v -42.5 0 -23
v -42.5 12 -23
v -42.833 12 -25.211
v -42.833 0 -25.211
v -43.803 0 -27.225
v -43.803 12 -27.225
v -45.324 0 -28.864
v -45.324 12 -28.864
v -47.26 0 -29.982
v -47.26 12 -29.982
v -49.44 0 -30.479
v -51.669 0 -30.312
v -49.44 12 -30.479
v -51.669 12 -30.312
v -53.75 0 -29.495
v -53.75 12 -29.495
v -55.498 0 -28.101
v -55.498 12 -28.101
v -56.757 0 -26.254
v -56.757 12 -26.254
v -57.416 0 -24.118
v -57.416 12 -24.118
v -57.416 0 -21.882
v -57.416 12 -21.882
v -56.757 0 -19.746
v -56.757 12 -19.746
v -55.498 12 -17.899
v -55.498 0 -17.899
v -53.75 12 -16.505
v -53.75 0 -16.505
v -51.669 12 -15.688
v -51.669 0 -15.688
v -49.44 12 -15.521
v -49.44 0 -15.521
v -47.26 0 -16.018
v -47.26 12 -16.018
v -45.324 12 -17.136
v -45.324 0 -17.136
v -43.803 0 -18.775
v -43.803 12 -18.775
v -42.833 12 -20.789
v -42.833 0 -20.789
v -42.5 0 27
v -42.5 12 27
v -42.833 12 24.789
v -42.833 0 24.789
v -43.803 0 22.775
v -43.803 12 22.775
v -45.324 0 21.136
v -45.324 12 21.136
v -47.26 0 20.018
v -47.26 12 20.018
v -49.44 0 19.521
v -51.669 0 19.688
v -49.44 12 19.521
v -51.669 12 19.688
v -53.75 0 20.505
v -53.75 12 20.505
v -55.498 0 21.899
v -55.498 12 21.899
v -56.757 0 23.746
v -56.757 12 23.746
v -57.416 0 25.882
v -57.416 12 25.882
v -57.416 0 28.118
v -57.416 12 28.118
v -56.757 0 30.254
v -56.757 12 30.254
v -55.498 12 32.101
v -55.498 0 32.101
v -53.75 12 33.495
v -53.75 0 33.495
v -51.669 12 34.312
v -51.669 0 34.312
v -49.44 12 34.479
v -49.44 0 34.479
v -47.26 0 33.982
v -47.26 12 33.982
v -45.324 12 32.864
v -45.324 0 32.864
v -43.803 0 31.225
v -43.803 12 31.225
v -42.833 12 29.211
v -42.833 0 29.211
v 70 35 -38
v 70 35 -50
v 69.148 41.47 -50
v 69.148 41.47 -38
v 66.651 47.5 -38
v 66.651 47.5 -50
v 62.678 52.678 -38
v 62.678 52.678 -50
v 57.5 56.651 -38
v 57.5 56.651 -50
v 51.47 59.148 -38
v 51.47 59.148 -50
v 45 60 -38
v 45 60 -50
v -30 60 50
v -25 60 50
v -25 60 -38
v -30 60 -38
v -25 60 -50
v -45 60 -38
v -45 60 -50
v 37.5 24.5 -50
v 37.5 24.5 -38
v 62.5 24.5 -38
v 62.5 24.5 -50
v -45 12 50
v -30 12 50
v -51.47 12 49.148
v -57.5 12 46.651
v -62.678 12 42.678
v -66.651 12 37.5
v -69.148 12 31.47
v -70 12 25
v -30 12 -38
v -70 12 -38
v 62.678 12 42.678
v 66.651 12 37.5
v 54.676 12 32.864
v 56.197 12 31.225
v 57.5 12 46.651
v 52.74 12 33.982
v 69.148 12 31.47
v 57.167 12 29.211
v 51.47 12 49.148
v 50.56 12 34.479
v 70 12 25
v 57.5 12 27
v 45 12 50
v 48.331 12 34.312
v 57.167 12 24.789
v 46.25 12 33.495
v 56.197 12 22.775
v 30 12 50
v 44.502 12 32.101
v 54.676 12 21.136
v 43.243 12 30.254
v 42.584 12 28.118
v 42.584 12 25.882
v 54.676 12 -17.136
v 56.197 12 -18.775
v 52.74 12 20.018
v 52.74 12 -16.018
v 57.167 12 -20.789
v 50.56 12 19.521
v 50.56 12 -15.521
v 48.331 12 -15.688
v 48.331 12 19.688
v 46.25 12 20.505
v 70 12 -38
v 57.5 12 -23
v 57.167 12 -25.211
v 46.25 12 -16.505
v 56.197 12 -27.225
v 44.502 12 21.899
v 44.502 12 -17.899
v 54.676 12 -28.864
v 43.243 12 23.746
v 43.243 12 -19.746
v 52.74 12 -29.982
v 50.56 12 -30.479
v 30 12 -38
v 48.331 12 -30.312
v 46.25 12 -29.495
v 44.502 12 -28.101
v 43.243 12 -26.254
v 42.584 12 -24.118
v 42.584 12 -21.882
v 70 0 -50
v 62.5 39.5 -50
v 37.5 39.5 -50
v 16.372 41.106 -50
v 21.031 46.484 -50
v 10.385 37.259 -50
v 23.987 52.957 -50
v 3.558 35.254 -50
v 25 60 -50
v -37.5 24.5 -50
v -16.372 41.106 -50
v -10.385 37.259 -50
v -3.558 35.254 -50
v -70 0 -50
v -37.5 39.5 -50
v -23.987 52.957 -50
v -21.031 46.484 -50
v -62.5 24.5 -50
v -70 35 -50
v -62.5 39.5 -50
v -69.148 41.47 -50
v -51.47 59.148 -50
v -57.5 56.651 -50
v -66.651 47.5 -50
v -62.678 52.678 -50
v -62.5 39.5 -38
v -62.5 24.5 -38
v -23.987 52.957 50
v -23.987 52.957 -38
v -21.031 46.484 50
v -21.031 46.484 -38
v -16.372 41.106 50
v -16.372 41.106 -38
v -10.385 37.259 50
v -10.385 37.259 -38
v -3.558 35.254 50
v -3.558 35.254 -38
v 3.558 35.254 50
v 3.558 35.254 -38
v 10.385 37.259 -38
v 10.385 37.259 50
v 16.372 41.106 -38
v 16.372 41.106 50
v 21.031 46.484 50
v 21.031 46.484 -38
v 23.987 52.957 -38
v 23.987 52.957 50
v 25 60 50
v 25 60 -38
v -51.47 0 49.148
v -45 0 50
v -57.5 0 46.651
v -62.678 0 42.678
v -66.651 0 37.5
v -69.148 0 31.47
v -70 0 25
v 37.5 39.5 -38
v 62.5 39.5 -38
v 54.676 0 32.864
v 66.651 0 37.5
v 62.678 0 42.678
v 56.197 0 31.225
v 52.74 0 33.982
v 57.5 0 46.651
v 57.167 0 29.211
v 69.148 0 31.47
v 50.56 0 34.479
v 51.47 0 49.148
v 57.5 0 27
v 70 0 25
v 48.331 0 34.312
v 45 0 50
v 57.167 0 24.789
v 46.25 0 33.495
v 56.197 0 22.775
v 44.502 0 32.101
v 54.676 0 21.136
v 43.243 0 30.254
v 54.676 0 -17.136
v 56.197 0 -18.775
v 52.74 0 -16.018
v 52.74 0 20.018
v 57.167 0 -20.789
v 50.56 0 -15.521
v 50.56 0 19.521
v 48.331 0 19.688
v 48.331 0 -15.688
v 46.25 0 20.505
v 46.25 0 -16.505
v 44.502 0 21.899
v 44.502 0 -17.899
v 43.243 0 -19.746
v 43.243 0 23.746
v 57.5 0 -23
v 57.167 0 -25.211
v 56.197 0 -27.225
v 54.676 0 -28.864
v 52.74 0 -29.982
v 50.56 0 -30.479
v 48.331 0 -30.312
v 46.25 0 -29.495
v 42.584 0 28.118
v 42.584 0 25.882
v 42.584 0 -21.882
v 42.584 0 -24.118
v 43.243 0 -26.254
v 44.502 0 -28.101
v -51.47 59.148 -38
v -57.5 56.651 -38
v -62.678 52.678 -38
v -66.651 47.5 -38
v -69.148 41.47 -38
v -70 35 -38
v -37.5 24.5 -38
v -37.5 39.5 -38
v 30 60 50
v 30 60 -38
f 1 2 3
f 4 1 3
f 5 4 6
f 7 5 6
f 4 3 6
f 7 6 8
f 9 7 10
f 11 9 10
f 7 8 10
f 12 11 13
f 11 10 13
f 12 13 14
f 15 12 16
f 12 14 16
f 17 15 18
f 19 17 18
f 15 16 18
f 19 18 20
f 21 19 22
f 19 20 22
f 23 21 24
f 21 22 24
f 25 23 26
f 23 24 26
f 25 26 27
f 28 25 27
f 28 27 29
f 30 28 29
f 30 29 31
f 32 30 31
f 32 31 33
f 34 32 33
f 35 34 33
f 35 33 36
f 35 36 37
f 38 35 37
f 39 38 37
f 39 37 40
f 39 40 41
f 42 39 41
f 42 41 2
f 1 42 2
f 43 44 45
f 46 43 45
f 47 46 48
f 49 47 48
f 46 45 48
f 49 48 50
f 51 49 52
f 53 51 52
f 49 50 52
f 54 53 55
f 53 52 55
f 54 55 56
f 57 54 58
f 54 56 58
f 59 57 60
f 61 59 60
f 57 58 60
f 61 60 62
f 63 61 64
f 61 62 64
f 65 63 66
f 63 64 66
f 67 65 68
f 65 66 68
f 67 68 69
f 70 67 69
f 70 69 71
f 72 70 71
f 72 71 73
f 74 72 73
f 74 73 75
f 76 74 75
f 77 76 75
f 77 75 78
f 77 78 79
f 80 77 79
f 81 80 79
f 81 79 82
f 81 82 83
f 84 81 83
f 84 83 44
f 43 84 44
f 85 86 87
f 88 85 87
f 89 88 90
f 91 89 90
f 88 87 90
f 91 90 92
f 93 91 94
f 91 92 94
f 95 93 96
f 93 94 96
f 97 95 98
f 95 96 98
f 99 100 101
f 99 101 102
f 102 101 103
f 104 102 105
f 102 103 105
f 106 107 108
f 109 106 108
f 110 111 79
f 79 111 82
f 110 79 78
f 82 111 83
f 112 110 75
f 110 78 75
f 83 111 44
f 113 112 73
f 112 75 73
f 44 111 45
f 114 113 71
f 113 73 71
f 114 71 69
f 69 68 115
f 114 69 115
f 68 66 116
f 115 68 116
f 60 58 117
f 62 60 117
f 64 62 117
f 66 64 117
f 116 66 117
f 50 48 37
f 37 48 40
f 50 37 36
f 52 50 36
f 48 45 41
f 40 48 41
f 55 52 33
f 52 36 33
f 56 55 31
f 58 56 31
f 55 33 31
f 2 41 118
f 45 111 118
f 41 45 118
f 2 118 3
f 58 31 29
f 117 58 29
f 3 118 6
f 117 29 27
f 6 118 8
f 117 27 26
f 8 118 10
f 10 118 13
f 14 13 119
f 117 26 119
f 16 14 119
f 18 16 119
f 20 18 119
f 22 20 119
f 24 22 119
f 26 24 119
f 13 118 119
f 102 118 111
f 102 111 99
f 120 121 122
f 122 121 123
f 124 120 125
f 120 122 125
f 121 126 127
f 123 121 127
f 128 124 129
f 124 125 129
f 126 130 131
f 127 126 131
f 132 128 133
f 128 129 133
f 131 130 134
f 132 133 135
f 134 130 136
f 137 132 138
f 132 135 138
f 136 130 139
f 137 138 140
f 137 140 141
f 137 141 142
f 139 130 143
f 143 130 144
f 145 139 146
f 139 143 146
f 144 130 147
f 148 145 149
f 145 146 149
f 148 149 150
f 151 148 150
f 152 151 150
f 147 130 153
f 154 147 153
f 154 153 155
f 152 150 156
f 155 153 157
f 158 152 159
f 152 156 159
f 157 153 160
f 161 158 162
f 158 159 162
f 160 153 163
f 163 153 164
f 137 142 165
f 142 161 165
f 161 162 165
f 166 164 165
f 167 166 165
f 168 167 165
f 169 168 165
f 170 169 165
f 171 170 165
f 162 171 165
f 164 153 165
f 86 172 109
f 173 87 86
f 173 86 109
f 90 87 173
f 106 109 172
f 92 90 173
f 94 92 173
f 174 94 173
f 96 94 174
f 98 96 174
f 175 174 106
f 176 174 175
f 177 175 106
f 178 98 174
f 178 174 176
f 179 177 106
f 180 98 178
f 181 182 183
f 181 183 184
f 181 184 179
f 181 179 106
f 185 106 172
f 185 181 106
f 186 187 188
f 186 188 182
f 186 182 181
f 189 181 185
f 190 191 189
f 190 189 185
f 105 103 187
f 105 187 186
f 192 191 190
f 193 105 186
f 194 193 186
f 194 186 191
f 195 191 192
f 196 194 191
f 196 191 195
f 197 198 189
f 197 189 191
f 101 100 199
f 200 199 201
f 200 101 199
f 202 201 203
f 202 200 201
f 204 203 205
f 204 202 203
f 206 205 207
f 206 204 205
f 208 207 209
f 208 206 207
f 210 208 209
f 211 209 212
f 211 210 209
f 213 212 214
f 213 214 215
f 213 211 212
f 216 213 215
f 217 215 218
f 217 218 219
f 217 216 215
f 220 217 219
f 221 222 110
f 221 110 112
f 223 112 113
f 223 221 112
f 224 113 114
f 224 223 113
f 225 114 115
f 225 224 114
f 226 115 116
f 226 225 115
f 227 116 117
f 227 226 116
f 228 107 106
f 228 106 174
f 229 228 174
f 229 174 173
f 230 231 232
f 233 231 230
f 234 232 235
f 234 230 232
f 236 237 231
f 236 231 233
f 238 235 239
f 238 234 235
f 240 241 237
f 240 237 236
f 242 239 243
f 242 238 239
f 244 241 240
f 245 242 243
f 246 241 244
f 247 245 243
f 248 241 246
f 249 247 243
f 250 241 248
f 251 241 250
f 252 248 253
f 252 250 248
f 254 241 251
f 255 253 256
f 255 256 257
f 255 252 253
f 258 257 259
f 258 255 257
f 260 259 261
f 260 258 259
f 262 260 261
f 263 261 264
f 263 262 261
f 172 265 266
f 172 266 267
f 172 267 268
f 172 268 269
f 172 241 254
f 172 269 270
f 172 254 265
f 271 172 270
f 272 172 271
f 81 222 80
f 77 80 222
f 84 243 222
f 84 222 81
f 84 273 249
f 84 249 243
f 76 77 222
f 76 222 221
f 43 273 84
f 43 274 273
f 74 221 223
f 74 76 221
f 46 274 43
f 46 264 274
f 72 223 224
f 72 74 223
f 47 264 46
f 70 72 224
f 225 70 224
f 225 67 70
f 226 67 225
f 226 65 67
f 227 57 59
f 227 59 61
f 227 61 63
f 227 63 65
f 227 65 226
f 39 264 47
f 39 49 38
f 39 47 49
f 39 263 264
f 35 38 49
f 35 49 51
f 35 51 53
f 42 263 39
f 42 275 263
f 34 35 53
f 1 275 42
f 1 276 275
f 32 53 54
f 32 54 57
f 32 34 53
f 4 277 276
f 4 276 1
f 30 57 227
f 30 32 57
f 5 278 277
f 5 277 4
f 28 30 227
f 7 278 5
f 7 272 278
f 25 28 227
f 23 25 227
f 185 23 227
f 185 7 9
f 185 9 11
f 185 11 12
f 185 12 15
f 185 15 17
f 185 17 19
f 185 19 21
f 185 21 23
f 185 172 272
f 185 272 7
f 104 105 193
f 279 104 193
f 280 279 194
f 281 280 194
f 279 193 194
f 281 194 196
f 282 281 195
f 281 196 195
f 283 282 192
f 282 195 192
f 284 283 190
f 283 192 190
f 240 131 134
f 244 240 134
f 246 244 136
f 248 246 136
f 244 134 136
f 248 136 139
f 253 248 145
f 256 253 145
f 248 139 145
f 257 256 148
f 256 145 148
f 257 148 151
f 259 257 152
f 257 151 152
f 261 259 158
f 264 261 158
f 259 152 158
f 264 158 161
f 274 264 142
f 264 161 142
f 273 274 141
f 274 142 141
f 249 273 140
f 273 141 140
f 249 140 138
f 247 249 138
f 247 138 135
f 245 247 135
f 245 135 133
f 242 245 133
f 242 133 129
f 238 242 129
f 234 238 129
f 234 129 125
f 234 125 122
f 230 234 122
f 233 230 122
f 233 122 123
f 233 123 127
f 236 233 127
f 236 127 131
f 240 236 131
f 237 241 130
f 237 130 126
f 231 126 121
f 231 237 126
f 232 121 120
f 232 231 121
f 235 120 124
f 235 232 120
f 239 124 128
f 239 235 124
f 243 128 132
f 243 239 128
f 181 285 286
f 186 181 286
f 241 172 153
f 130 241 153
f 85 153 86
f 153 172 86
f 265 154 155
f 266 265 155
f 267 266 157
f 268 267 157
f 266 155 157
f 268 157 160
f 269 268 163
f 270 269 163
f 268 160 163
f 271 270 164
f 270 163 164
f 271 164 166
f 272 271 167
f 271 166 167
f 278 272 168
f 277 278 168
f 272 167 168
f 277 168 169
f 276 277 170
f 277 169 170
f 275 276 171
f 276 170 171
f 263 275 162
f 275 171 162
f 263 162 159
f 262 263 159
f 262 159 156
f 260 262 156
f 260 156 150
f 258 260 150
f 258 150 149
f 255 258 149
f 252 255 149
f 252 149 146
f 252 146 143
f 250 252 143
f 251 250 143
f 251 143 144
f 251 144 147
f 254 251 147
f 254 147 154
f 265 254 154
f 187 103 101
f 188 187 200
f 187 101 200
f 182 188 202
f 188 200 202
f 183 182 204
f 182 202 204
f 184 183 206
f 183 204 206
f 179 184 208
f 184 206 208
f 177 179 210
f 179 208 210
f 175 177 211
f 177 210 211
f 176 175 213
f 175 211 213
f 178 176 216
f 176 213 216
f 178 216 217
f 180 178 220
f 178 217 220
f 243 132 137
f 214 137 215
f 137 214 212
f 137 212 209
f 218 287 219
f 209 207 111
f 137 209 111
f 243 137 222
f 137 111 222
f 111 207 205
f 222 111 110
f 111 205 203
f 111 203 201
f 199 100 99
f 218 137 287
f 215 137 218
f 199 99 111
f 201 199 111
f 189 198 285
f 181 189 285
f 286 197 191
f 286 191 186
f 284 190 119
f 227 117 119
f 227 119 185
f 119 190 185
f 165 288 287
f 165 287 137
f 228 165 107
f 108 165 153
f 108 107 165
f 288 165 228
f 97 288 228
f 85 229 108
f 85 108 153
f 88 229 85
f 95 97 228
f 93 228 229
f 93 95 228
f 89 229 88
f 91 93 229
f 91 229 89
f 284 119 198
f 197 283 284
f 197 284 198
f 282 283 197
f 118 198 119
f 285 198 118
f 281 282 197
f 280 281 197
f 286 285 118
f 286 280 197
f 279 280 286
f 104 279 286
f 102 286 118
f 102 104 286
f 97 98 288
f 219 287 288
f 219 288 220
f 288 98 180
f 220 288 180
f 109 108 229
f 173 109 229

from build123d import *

# Parameters (mm, degrees)
BOSS_EXTRUDE2_DEPTH       = 12
BOSS_EXTRUDE3_DEPTH       = 12
BOSS_EXTRUDE6_DEPTH       = 100
SKETCH5_R                 = 25
CUT_EXTRUDE1_DEPTH        = 100
SKETCH7_R                 = 7.5
CUT_EXTRUDE2_DEPTH        = 100
LPATTERN2_COUNT           = 2
LPATTERN2_PITCH           = 50
LPATTERN5_COUNT           = 2
LPATTERN5_PITCH           = 100
LPATTERN6_COPY_1_SKETCH_R = 7.5
LPATTERN6_COPY_1_DEPTH    = 100
LPATTERN6_COPY_2_SKETCH_R = 7.5
LPATTERN6_COPY_2_DEPTH    = 100
SKETCH8_W                 = 25
SKETCH8_H                 = 15
CUT_EXTRUDE3_DEPTH        = 100


with BuildPart() as part:
    # Sketch1 → Boss-Extrude2 (new body)
    with BuildSketch(Plane(origin=(0, 0, 0), x_dir=(1, 0, 0), z_dir=(0, 1, 0))):
        with BuildLine():
            Line((-70, 50), (70, 50))
            Line((70, 50), (70, -25))
            ThreePointArc((70, -25), (62.67766953, -42.67766953), (45, -50))
            Line((45, -50), (-45, -50))
            ThreePointArc((-45, -50), (-62.67766953, -42.67766953), (-70, -25))
            Line((-70, -25), (-70, 50))
        make_face()
    extrude(amount=BOSS_EXTRUDE2_DEPTH)

    # Sketch2 → Boss-Extrude3 (add)
    with BuildSketch(Plane(origin=(0, 0, -50), x_dir=(-1, 0, 0), z_dir=(0, 0, -1))):
        with BuildLine():
            Line((-70, 12), (-70, 35))
            ThreePointArc((-70, 35), (-62.67766953, 52.67766953), (-45, 60))
            Line((-45, 60), (45, 60))
            ThreePointArc((45, 60), (62.67766953, 52.67766953), (70, 35))
            Line((70, 35), (70, 12))
            Line((70, 12), (-70, 12))
        make_face()
    extrude(amount=-BOSS_EXTRUDE3_DEPTH)

    # Sketch4 → Boss-Extrude6 (add)
    with BuildSketch(Plane(origin=(0, 0, -50), x_dir=(-1, 0, 0), z_dir=(0, 0, -1))):
        with BuildLine():
            Line((-25, 60), (-30, 60))
            Line((-30, 60), (-30, 12))
            Line((-30, 12), (30, 12))
            Line((30, 12), (30, 60))
            Line((30, 60), (25, 60))
            ThreePointArc((25, 60), (0, 35), (-25, 60))
        make_face()
    extrude(amount=-BOSS_EXTRUDE6_DEPTH)

    # Sketch5 → Cut-Extrude1 (cut)
    with BuildSketch(Plane.XY.offset(-38)):
        with Locations((0, 60)):
            Circle(SKETCH5_R)
    extrude(amount=-CUT_EXTRUDE1_DEPTH, mode=Mode.SUBTRACT)

    # Sketch7 → Cut-Extrude2 (cut)
    with BuildSketch(Plane(origin=(0, 12, 0), x_dir=(1, 0, 0), z_dir=(0, 1, 0))):
        with Locations((50, 23)):
            Circle(SKETCH7_R)
    cut_extrude2 = extrude(amount=-CUT_EXTRUDE2_DEPTH, mode=Mode.SUBTRACT)

    # LPattern2: Cut-Extrude2 ×2
    with Locations(*[(0, 0, i * LPATTERN2_PITCH) for i in range(1, LPATTERN2_COUNT)]):
        add(cut_extrude2, mode=Mode.SUBTRACT)

    # LPattern5: Cut-Extrude2 ×2
    with Locations(*[(-i * LPATTERN5_PITCH, 0, 0) for i in range(1, LPATTERN5_COUNT)]):
        add(cut_extrude2, mode=Mode.SUBTRACT)

    # LPattern6 copy 1 sketch → LPattern6 copy 1 (cut)
    with BuildSketch(Plane(origin=(-100, 12, 50), x_dir=(1, 0, 0), z_dir=(0, 1, 0))):
        with Locations((50, 23)):
            Circle(LPATTERN6_COPY_1_SKETCH_R)
    extrude(amount=-LPATTERN6_COPY_1_DEPTH, mode=Mode.SUBTRACT)

    # LPattern6 copy 2 sketch → LPattern6 copy 2 (cut)
    with BuildSketch(Plane(origin=(0, 12, 50), x_dir=(1, 0, 0), z_dir=(0, 1, 0))):
        with Locations((50, 23)):
            Circle(LPATTERN6_COPY_2_SKETCH_R)
    extrude(amount=-LPATTERN6_COPY_2_DEPTH, mode=Mode.SUBTRACT)

    # Sketch8 → Cut-Extrude3 (cut)
    with BuildSketch(Plane.XY.offset(-38)):
        with Locations((50, 32)):
            Rectangle(SKETCH8_W, SKETCH8_H)
        with Locations((-50, 32)):
            Rectangle(SKETCH8_W, SKETCH8_H)
    extrude(amount=-CUT_EXTRUDE3_DEPTH, mode=Mode.SUBTRACT)


solid = part.part
